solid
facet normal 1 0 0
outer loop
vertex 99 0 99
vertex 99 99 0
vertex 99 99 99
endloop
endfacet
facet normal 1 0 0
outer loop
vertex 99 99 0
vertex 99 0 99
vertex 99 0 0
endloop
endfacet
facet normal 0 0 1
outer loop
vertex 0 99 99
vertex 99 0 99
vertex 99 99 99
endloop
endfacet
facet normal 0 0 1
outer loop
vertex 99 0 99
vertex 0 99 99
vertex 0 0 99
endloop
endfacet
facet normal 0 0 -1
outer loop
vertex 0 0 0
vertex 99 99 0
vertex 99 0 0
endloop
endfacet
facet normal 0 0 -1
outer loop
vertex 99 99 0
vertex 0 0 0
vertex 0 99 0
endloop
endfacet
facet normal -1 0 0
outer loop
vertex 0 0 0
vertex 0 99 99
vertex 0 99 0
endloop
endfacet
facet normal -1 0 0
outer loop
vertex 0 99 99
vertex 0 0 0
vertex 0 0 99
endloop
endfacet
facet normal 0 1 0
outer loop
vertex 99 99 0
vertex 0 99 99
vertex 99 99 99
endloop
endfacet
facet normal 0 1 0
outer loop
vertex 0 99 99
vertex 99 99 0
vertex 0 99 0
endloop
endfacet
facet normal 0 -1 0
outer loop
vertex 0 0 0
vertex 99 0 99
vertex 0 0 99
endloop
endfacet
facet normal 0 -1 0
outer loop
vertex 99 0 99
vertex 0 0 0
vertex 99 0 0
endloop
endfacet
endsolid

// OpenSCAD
/* [Hidden] */
// ======== include <lib.scad> ========
WALL = 2;
module box() cube(WALL);
cube(99);

// ======== main.scad ========
box();
